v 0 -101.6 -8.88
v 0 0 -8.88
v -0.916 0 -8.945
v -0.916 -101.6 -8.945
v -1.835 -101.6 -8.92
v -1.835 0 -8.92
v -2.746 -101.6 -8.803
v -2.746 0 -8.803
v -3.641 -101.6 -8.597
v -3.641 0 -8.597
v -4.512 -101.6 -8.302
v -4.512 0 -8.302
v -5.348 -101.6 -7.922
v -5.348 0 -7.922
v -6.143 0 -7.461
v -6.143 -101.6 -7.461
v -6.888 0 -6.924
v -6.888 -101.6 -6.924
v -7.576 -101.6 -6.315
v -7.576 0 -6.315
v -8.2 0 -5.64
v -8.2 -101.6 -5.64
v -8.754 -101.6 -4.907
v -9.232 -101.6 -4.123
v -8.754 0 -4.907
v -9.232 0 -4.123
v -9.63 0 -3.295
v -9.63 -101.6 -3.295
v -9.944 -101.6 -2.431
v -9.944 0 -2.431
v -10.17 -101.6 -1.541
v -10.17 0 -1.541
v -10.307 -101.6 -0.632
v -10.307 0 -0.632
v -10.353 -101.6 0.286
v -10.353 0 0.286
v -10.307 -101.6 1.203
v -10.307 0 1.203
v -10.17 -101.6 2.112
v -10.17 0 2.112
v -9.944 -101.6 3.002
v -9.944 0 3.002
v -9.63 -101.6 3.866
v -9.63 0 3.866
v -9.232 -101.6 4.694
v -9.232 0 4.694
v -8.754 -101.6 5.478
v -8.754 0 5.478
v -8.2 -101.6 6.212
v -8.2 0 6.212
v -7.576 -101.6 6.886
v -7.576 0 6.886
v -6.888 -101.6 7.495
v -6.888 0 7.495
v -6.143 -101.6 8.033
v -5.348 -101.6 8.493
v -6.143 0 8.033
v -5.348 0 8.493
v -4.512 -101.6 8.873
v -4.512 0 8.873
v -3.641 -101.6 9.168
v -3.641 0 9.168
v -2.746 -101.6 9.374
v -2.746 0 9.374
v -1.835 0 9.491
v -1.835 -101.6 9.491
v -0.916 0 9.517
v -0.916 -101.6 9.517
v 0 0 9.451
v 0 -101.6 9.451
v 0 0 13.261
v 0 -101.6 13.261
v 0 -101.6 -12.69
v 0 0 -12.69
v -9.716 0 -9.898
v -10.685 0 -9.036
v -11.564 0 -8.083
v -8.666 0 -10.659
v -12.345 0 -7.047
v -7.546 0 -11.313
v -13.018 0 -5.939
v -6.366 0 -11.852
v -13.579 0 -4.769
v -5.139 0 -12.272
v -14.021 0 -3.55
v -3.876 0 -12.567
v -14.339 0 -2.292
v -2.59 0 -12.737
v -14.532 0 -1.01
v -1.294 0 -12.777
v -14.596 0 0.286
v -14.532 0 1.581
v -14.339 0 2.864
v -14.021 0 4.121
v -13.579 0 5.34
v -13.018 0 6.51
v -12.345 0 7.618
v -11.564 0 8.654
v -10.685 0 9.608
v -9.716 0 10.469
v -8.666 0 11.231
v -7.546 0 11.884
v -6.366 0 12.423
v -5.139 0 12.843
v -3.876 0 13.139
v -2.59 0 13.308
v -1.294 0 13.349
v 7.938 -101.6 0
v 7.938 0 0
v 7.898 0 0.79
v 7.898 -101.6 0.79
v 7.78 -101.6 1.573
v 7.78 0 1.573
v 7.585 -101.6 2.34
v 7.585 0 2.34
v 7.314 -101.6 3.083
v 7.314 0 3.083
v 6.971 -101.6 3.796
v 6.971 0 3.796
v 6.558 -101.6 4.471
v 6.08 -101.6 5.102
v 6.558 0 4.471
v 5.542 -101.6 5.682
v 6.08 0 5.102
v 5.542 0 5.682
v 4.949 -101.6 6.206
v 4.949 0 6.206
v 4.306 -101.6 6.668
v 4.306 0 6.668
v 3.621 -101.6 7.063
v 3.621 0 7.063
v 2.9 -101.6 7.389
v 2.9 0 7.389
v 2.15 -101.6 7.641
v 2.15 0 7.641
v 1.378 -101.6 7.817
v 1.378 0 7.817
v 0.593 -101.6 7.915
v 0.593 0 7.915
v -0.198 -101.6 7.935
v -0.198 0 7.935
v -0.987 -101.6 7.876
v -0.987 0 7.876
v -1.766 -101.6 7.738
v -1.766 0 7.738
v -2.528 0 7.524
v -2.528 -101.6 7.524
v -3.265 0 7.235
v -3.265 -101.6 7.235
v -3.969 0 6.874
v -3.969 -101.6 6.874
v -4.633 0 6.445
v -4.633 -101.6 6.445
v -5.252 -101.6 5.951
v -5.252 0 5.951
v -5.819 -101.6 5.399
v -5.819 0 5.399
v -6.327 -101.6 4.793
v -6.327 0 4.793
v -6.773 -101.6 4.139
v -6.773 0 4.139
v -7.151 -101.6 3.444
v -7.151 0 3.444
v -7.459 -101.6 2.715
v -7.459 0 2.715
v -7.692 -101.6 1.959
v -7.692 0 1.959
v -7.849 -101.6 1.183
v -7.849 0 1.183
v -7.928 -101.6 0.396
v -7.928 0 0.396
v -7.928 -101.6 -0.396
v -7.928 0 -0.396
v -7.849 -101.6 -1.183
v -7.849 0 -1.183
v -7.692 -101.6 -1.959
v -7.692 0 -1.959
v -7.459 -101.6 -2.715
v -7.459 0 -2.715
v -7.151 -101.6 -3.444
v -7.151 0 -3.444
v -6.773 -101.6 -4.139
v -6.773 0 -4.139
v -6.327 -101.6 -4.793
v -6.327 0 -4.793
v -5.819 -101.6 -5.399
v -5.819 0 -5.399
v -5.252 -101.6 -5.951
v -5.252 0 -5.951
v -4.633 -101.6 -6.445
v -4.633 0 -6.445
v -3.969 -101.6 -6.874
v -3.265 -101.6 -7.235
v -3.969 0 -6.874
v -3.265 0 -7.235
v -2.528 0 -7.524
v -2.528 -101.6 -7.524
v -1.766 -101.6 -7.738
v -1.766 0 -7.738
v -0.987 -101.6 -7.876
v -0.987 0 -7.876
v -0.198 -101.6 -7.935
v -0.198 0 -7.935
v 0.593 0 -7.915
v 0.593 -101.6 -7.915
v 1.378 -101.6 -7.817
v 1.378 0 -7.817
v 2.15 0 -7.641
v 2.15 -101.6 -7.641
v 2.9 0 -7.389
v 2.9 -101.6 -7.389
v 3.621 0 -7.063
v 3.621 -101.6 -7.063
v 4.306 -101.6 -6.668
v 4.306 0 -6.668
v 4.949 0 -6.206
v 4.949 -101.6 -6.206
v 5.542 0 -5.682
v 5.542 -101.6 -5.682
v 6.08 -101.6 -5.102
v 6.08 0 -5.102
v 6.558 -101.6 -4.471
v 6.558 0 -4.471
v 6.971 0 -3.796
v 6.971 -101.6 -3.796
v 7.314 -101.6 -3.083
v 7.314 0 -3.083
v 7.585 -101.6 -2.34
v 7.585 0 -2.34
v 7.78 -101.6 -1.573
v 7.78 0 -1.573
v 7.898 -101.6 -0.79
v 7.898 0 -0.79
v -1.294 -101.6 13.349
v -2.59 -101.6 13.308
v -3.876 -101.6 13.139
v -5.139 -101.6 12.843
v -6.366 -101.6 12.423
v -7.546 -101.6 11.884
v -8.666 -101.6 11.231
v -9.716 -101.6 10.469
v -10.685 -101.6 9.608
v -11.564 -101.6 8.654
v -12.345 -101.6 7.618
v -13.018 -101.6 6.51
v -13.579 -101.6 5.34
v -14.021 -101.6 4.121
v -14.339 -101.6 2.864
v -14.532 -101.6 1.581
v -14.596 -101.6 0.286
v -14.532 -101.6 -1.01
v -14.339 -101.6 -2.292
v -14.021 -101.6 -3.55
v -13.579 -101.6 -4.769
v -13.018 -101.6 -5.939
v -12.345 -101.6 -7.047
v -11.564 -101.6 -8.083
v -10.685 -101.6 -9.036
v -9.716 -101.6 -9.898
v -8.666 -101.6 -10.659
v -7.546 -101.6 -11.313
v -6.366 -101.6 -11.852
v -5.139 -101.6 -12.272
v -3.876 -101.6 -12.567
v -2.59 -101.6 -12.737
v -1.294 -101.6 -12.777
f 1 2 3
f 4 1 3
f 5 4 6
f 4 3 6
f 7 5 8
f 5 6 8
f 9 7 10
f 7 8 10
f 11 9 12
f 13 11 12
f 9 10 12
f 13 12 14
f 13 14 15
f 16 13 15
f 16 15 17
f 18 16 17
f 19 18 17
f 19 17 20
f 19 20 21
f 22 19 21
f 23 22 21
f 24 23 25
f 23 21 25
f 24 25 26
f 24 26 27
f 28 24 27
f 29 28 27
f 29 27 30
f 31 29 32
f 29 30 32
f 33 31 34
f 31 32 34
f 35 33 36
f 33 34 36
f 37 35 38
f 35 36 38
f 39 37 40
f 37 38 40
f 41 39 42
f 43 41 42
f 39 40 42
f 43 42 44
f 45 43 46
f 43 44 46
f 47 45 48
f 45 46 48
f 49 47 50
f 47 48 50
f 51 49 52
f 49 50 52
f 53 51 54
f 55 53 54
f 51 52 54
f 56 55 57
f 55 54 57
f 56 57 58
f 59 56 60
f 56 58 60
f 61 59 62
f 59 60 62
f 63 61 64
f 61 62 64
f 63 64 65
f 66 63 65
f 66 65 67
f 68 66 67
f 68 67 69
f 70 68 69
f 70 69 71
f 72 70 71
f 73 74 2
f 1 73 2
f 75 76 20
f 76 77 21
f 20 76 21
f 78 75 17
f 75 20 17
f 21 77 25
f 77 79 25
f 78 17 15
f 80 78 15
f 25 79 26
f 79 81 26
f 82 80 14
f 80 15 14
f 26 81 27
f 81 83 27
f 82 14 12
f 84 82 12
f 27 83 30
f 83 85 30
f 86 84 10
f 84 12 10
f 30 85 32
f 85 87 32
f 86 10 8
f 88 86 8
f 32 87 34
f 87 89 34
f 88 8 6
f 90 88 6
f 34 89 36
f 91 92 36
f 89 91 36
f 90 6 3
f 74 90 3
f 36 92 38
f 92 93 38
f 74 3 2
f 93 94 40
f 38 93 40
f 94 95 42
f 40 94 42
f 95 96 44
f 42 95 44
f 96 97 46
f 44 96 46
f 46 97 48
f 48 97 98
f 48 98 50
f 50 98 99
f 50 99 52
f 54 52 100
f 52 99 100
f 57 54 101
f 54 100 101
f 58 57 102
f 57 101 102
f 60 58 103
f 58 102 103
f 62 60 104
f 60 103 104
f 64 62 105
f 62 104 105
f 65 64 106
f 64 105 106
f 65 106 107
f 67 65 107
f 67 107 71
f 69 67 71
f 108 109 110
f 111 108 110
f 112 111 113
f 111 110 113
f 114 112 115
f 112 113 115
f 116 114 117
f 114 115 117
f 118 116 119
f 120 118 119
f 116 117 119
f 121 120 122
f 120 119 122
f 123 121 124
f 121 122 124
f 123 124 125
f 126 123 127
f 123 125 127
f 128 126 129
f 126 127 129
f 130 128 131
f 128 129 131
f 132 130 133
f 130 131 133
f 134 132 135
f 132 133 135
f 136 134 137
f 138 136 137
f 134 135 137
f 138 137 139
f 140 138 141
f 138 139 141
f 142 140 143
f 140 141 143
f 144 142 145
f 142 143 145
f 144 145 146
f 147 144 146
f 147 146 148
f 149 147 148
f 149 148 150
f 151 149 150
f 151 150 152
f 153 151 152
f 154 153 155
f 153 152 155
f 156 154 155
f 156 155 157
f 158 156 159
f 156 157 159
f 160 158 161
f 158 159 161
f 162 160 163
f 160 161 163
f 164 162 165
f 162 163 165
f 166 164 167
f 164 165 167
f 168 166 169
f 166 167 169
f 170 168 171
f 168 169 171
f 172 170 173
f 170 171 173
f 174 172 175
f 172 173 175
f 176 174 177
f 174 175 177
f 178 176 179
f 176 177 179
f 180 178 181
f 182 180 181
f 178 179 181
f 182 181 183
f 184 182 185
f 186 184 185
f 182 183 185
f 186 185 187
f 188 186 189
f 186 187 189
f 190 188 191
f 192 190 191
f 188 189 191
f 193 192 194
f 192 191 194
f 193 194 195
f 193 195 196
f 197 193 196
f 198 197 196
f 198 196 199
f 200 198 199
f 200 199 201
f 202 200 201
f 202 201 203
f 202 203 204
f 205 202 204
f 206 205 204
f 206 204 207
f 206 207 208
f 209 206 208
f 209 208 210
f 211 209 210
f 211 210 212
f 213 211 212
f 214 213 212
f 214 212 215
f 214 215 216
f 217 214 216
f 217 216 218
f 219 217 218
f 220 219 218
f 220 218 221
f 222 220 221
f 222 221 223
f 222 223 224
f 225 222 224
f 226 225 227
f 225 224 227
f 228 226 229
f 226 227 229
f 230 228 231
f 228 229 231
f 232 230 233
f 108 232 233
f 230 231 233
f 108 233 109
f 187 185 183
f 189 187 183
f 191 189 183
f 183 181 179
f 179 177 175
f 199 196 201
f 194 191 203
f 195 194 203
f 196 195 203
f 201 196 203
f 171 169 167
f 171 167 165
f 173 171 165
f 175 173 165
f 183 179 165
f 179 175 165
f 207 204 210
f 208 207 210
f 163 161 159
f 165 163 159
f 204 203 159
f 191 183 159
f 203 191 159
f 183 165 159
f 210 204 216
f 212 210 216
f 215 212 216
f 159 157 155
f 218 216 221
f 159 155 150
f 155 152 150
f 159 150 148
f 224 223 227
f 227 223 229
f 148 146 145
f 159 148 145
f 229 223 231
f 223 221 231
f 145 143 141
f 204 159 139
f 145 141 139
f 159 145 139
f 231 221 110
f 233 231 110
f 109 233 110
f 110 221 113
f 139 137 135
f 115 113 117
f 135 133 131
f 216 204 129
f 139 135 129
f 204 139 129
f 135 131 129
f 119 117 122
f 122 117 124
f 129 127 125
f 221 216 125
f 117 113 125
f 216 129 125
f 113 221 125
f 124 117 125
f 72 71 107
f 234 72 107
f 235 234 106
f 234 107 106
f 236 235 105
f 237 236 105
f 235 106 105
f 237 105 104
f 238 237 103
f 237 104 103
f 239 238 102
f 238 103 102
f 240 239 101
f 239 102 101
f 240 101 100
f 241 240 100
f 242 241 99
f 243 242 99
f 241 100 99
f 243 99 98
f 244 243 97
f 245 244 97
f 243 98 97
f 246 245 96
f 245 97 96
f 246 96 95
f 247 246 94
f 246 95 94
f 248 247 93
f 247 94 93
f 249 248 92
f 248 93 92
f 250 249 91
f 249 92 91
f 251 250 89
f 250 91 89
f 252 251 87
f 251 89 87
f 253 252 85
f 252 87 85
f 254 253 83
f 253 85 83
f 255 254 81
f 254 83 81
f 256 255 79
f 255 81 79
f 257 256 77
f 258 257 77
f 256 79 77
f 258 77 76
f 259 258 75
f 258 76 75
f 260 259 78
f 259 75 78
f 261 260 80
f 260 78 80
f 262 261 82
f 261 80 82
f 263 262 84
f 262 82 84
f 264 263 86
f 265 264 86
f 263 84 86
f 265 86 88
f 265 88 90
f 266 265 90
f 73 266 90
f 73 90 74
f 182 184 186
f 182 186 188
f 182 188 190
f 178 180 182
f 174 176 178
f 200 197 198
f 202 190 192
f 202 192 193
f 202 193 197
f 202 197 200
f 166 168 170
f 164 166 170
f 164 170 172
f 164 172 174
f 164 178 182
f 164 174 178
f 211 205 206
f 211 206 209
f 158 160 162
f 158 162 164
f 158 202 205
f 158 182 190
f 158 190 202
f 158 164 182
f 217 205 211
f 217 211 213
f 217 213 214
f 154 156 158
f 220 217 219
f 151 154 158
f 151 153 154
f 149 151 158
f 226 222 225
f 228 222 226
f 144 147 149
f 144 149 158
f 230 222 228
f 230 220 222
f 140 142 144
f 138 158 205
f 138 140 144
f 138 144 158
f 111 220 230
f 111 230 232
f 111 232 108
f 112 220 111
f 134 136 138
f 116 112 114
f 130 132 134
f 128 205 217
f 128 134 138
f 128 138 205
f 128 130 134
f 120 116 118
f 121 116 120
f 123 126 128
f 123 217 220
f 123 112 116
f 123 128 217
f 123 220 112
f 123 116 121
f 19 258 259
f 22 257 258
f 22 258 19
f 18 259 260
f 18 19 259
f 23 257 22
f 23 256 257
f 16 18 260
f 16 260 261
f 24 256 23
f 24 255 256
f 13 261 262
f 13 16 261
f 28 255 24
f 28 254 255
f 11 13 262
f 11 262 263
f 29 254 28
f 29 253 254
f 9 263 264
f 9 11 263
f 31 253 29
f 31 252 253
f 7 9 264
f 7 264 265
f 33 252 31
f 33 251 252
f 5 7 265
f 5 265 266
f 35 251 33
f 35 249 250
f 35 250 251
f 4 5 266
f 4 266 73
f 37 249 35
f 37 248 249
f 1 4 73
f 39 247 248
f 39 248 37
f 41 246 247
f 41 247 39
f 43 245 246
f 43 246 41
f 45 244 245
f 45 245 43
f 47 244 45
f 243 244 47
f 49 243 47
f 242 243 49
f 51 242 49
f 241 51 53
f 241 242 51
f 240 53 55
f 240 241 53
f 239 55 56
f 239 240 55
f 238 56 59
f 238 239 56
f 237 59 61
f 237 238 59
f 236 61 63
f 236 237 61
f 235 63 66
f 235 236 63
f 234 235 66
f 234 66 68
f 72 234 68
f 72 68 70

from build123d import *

# Parameters (mm, degrees)
F0_R     = 7.9375
F1_DEPTH = 101.6


with BuildPart() as f1:
    # F0 (on Front) → F1 (new body)
    with BuildSketch(Plane.XZ):
        with BuildLine():
            ThreePointArc((0, -8.879608), (-10.352616, 0.285607), (0, 9.450822))
            Line((0, 9.450822), (0, 13.260822))
            ThreePointArc((0, 13.260822), (-14.596247, 0.285607), (0, -12.689608))
            Line((0, -12.689608), (0, -8.879608))
        make_face()
        Circle(F0_R)
    extrude(amount=F1_DEPTH)


solid = f1.part
